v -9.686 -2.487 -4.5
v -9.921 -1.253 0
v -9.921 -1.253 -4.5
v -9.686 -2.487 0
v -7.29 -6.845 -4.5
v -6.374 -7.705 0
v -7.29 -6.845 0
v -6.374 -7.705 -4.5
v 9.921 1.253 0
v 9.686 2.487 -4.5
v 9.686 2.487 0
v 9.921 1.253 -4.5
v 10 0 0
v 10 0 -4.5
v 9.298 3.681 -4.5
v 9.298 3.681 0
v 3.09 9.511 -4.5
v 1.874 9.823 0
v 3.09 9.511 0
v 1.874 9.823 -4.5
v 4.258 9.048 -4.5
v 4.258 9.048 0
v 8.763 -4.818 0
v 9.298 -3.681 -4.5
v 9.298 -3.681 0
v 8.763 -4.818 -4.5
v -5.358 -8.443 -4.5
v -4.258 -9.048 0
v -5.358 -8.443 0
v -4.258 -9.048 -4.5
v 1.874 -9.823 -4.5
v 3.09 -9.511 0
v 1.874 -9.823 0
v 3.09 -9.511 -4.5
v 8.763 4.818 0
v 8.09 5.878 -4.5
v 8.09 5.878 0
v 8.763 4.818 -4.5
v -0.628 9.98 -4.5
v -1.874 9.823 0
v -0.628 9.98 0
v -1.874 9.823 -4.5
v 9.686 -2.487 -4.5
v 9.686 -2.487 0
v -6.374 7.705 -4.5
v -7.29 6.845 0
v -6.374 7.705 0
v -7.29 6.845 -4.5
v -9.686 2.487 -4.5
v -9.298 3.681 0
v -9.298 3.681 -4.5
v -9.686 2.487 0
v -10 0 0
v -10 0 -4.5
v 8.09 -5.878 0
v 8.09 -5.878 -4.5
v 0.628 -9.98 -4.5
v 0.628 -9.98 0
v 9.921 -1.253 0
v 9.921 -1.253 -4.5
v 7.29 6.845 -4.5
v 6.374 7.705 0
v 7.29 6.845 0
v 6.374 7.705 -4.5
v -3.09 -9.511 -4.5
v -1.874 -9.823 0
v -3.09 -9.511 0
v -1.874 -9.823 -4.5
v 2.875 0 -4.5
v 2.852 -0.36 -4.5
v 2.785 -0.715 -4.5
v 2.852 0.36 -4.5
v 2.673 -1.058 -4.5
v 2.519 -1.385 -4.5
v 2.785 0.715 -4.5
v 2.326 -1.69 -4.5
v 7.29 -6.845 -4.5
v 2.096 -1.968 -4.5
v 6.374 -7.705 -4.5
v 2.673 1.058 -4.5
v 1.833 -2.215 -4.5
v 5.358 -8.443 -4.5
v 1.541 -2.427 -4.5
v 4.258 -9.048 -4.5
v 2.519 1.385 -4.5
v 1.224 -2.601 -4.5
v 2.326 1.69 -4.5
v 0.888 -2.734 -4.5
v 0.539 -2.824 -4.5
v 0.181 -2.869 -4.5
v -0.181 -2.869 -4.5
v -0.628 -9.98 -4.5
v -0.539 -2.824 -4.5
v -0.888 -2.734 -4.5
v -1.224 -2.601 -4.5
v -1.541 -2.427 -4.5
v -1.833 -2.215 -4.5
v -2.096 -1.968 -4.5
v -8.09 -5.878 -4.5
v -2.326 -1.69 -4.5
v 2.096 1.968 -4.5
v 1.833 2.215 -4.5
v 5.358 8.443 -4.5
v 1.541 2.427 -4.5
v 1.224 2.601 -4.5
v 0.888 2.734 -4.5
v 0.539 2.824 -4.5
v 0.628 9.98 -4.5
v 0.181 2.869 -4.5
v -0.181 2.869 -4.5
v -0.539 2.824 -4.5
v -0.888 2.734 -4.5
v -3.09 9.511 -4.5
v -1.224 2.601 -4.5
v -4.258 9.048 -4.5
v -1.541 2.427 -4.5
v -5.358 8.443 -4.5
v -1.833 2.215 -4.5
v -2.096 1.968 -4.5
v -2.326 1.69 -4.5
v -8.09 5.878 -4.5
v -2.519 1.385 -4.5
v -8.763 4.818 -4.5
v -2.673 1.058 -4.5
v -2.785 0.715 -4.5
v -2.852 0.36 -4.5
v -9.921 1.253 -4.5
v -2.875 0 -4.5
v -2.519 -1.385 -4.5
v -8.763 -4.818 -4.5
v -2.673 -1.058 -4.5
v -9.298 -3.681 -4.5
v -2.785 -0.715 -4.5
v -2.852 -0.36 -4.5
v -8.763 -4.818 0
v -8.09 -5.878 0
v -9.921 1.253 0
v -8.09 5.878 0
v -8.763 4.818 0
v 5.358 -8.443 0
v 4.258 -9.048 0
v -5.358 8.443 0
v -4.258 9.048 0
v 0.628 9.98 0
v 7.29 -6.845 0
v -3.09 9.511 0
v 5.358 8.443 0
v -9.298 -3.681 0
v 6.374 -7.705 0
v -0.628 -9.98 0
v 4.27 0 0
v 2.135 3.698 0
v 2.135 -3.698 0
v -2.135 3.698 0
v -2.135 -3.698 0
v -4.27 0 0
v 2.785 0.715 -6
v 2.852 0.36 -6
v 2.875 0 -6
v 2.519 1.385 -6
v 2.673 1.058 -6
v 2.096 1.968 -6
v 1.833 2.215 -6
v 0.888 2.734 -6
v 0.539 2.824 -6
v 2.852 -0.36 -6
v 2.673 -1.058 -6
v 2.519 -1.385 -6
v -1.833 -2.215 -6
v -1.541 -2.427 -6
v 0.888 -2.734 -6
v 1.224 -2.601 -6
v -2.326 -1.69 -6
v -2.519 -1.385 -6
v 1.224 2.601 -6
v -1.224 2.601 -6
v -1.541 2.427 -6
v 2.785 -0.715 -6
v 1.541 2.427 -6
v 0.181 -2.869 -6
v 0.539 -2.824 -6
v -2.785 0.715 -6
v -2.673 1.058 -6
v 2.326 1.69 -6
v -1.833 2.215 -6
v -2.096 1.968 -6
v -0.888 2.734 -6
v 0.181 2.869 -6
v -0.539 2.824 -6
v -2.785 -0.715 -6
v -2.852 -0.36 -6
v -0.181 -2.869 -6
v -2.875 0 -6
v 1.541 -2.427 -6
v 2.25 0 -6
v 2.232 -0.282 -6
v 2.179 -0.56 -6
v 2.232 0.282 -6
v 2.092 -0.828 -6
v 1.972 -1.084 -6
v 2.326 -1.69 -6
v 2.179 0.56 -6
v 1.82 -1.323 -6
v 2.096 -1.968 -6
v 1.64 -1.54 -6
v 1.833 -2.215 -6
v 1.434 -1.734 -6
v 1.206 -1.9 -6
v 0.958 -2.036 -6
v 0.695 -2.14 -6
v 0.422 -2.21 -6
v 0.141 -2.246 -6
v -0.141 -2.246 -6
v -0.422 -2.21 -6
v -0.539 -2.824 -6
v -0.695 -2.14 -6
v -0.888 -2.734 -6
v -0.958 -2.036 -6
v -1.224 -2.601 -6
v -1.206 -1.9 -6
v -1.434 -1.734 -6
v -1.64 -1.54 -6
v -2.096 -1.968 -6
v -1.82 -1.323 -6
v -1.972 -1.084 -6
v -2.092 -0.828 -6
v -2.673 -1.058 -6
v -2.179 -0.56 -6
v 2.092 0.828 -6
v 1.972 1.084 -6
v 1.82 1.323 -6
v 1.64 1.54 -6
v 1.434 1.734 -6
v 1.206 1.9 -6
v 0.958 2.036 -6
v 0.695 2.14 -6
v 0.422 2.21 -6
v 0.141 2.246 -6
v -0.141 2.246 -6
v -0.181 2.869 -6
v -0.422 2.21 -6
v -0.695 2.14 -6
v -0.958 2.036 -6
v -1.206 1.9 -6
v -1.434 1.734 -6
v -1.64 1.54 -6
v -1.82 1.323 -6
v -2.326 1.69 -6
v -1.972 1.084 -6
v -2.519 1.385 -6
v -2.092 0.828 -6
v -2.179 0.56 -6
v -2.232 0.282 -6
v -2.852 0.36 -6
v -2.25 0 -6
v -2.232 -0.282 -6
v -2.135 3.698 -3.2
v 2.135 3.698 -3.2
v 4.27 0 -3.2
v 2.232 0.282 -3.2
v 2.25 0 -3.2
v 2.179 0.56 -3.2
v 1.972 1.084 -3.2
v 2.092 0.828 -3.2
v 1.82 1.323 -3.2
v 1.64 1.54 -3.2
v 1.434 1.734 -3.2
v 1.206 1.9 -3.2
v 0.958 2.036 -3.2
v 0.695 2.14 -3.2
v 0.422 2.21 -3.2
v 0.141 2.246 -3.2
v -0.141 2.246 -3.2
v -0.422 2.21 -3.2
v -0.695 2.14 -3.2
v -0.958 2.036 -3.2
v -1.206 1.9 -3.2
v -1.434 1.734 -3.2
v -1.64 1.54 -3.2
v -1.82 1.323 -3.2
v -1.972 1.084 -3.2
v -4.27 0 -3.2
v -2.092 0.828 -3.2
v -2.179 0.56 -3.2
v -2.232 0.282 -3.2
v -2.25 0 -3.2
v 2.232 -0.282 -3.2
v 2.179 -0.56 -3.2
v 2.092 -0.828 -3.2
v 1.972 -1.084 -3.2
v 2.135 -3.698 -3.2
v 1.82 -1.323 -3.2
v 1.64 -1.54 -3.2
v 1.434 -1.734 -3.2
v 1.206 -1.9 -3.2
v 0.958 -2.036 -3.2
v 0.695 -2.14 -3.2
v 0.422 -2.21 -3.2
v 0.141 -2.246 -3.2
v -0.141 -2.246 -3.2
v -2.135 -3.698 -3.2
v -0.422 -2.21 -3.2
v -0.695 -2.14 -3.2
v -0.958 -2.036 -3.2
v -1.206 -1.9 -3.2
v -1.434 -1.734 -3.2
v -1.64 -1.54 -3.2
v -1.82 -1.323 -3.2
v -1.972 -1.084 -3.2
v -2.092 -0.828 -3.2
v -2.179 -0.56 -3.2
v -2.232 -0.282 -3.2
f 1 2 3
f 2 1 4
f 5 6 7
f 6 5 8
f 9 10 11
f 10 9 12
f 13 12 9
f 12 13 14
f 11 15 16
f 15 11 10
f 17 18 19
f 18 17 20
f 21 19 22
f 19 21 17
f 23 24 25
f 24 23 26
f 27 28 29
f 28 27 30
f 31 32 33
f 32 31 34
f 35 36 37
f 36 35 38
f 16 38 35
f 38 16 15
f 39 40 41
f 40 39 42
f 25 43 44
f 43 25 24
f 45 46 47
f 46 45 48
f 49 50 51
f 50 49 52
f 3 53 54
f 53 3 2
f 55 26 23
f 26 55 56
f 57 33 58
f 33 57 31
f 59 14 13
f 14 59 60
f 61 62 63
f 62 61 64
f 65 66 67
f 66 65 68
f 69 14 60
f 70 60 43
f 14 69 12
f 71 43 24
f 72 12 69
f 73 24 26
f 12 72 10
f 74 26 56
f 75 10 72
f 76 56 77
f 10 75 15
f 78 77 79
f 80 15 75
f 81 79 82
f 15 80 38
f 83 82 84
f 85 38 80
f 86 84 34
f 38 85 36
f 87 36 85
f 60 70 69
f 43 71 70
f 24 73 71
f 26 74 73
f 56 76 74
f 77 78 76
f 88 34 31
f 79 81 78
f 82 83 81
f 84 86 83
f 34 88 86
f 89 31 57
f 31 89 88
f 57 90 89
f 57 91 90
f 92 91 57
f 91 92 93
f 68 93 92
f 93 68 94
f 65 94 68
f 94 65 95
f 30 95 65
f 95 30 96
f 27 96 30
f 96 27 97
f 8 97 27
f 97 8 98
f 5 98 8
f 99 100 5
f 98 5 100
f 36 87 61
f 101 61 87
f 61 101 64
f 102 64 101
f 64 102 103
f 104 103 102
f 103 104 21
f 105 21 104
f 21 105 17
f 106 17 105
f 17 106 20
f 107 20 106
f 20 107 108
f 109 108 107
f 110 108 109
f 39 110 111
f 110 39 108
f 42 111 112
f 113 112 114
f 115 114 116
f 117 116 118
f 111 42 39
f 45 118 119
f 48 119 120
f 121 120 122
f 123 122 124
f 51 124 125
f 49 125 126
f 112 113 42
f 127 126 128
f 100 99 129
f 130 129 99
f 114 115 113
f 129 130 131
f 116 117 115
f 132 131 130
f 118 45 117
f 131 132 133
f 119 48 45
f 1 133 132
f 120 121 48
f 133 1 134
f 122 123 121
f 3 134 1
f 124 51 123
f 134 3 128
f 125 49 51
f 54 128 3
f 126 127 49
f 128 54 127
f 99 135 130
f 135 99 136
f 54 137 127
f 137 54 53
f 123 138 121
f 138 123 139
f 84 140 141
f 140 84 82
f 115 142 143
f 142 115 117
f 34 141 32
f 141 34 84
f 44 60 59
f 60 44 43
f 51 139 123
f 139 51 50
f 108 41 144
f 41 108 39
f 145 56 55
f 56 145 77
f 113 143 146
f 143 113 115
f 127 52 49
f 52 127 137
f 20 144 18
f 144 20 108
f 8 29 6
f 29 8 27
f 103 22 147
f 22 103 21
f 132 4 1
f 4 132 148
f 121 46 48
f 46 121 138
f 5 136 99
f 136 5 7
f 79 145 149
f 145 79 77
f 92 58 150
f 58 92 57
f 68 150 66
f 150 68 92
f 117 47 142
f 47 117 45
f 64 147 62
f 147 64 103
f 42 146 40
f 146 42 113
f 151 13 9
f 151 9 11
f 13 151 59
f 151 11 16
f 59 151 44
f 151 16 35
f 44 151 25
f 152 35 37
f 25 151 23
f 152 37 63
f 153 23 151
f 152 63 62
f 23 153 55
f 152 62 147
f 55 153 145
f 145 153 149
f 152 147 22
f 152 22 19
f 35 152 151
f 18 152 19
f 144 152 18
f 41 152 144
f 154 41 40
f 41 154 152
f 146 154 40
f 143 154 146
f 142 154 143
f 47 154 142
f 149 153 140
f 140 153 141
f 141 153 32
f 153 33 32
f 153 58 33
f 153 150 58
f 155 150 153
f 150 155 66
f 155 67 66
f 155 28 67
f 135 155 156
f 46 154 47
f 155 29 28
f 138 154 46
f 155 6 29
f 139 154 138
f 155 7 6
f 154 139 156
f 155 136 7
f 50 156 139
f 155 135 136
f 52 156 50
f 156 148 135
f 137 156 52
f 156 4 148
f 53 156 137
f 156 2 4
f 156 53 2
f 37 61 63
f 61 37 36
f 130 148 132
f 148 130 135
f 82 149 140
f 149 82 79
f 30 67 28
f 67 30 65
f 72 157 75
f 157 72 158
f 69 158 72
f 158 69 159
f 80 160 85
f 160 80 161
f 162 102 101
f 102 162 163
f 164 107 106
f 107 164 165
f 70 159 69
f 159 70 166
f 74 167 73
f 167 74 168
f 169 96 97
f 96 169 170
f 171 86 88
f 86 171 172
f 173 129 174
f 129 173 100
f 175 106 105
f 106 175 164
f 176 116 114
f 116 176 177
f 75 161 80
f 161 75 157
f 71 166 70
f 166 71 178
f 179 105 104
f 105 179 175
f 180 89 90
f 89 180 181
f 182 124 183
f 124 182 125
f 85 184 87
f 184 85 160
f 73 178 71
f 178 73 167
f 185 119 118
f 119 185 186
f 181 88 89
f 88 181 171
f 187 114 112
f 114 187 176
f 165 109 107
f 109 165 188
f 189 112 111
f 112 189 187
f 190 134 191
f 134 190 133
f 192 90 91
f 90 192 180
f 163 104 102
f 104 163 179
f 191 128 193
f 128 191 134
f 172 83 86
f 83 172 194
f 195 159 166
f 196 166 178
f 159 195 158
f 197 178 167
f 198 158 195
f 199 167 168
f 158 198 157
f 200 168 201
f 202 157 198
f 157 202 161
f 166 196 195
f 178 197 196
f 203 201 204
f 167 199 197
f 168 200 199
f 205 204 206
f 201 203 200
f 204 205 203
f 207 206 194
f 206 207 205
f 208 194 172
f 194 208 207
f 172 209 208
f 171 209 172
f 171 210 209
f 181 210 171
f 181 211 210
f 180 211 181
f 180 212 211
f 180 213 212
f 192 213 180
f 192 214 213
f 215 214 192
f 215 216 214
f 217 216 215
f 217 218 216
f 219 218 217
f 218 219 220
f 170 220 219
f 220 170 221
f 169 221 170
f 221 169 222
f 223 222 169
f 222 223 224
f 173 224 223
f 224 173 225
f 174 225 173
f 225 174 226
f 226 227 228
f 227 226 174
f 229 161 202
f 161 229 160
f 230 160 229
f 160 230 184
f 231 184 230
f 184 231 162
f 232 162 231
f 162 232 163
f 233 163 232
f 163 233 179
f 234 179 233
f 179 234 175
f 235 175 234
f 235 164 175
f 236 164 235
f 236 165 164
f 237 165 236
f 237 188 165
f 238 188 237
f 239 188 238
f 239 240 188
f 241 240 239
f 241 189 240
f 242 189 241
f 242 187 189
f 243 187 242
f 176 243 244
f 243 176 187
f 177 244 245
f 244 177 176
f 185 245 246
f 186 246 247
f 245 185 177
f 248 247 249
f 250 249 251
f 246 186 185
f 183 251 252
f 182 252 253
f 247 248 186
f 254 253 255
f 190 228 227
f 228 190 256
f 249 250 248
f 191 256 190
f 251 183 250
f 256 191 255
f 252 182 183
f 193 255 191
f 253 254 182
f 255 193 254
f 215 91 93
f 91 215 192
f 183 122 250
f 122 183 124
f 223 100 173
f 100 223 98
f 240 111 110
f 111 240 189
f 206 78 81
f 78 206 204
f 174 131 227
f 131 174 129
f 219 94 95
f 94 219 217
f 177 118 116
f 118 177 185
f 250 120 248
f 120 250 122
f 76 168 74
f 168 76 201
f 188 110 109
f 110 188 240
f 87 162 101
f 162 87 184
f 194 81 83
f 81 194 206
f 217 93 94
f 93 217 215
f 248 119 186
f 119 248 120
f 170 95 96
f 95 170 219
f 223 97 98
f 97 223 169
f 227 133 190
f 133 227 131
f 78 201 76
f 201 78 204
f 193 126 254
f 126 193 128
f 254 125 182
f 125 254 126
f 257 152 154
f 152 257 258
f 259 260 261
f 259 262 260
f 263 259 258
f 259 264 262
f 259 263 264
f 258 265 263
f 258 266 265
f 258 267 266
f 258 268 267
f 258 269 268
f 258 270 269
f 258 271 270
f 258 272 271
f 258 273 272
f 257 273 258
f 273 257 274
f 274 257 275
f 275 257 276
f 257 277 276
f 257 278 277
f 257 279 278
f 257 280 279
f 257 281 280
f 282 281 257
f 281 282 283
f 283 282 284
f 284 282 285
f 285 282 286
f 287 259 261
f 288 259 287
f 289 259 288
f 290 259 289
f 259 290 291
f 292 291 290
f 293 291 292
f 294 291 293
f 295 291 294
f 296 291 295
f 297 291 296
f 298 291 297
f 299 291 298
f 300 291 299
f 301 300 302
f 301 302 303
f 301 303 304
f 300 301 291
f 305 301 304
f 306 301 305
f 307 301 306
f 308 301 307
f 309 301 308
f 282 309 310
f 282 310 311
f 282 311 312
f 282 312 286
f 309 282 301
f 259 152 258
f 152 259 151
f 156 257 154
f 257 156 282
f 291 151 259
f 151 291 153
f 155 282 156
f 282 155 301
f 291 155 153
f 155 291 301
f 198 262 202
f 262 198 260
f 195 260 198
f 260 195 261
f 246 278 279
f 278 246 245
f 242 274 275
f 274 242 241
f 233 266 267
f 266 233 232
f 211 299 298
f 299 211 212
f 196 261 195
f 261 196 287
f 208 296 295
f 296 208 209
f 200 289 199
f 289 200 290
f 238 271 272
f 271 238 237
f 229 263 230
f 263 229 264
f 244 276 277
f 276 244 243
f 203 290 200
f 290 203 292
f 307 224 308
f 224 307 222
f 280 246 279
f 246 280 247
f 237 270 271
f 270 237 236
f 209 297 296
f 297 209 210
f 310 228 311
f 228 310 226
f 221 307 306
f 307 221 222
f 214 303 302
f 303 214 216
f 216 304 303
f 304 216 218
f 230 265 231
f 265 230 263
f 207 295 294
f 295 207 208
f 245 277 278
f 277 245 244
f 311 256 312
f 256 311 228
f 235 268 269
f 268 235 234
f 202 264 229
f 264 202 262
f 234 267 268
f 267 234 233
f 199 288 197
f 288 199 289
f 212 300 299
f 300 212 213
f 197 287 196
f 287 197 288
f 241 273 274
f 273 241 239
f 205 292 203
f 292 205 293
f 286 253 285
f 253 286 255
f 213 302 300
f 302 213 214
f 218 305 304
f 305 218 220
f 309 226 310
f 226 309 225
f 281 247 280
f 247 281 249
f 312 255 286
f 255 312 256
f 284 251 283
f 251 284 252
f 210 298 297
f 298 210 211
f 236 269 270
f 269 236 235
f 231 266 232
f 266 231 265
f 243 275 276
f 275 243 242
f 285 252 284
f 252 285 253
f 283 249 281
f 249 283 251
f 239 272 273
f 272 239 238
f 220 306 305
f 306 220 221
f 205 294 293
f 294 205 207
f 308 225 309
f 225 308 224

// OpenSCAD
$fn = 50;

difference() {
	union() {
		translate(v = [0, 0, -4.5]) {
			cylinder(h = 4.5, r = 10.0);
		}
		#translate(v = [0, 0, -6.0]) {
			cylinder(h = 6, r = 2.875);
		}
	}
	union() {
		translate(v = [0, 0, 0]) {
			rotate(a = [0, 0, 0]) {
				difference() {
					union() {
						translate(v = [0, 0, -3.2]) {
							linear_extrude(height = 3.2) {
								polygon(points = [[4.2698, 0.0], [2.1349000000000005, 3.697755269078796], [-2.134899999999999, 3.6977552690787965], [-4.2698, 5.228996902999369e-16], [-2.134900000000002, -3.6977552690787956], [2.1348999999999974, -3.697755269078798]]);
							}
						}
					}
					union();
				}
			}
		}
		#translate(v = [0, 0, -100.0]) {
			cylinder(h = 200, r = 2.25);
		}
	}
}
